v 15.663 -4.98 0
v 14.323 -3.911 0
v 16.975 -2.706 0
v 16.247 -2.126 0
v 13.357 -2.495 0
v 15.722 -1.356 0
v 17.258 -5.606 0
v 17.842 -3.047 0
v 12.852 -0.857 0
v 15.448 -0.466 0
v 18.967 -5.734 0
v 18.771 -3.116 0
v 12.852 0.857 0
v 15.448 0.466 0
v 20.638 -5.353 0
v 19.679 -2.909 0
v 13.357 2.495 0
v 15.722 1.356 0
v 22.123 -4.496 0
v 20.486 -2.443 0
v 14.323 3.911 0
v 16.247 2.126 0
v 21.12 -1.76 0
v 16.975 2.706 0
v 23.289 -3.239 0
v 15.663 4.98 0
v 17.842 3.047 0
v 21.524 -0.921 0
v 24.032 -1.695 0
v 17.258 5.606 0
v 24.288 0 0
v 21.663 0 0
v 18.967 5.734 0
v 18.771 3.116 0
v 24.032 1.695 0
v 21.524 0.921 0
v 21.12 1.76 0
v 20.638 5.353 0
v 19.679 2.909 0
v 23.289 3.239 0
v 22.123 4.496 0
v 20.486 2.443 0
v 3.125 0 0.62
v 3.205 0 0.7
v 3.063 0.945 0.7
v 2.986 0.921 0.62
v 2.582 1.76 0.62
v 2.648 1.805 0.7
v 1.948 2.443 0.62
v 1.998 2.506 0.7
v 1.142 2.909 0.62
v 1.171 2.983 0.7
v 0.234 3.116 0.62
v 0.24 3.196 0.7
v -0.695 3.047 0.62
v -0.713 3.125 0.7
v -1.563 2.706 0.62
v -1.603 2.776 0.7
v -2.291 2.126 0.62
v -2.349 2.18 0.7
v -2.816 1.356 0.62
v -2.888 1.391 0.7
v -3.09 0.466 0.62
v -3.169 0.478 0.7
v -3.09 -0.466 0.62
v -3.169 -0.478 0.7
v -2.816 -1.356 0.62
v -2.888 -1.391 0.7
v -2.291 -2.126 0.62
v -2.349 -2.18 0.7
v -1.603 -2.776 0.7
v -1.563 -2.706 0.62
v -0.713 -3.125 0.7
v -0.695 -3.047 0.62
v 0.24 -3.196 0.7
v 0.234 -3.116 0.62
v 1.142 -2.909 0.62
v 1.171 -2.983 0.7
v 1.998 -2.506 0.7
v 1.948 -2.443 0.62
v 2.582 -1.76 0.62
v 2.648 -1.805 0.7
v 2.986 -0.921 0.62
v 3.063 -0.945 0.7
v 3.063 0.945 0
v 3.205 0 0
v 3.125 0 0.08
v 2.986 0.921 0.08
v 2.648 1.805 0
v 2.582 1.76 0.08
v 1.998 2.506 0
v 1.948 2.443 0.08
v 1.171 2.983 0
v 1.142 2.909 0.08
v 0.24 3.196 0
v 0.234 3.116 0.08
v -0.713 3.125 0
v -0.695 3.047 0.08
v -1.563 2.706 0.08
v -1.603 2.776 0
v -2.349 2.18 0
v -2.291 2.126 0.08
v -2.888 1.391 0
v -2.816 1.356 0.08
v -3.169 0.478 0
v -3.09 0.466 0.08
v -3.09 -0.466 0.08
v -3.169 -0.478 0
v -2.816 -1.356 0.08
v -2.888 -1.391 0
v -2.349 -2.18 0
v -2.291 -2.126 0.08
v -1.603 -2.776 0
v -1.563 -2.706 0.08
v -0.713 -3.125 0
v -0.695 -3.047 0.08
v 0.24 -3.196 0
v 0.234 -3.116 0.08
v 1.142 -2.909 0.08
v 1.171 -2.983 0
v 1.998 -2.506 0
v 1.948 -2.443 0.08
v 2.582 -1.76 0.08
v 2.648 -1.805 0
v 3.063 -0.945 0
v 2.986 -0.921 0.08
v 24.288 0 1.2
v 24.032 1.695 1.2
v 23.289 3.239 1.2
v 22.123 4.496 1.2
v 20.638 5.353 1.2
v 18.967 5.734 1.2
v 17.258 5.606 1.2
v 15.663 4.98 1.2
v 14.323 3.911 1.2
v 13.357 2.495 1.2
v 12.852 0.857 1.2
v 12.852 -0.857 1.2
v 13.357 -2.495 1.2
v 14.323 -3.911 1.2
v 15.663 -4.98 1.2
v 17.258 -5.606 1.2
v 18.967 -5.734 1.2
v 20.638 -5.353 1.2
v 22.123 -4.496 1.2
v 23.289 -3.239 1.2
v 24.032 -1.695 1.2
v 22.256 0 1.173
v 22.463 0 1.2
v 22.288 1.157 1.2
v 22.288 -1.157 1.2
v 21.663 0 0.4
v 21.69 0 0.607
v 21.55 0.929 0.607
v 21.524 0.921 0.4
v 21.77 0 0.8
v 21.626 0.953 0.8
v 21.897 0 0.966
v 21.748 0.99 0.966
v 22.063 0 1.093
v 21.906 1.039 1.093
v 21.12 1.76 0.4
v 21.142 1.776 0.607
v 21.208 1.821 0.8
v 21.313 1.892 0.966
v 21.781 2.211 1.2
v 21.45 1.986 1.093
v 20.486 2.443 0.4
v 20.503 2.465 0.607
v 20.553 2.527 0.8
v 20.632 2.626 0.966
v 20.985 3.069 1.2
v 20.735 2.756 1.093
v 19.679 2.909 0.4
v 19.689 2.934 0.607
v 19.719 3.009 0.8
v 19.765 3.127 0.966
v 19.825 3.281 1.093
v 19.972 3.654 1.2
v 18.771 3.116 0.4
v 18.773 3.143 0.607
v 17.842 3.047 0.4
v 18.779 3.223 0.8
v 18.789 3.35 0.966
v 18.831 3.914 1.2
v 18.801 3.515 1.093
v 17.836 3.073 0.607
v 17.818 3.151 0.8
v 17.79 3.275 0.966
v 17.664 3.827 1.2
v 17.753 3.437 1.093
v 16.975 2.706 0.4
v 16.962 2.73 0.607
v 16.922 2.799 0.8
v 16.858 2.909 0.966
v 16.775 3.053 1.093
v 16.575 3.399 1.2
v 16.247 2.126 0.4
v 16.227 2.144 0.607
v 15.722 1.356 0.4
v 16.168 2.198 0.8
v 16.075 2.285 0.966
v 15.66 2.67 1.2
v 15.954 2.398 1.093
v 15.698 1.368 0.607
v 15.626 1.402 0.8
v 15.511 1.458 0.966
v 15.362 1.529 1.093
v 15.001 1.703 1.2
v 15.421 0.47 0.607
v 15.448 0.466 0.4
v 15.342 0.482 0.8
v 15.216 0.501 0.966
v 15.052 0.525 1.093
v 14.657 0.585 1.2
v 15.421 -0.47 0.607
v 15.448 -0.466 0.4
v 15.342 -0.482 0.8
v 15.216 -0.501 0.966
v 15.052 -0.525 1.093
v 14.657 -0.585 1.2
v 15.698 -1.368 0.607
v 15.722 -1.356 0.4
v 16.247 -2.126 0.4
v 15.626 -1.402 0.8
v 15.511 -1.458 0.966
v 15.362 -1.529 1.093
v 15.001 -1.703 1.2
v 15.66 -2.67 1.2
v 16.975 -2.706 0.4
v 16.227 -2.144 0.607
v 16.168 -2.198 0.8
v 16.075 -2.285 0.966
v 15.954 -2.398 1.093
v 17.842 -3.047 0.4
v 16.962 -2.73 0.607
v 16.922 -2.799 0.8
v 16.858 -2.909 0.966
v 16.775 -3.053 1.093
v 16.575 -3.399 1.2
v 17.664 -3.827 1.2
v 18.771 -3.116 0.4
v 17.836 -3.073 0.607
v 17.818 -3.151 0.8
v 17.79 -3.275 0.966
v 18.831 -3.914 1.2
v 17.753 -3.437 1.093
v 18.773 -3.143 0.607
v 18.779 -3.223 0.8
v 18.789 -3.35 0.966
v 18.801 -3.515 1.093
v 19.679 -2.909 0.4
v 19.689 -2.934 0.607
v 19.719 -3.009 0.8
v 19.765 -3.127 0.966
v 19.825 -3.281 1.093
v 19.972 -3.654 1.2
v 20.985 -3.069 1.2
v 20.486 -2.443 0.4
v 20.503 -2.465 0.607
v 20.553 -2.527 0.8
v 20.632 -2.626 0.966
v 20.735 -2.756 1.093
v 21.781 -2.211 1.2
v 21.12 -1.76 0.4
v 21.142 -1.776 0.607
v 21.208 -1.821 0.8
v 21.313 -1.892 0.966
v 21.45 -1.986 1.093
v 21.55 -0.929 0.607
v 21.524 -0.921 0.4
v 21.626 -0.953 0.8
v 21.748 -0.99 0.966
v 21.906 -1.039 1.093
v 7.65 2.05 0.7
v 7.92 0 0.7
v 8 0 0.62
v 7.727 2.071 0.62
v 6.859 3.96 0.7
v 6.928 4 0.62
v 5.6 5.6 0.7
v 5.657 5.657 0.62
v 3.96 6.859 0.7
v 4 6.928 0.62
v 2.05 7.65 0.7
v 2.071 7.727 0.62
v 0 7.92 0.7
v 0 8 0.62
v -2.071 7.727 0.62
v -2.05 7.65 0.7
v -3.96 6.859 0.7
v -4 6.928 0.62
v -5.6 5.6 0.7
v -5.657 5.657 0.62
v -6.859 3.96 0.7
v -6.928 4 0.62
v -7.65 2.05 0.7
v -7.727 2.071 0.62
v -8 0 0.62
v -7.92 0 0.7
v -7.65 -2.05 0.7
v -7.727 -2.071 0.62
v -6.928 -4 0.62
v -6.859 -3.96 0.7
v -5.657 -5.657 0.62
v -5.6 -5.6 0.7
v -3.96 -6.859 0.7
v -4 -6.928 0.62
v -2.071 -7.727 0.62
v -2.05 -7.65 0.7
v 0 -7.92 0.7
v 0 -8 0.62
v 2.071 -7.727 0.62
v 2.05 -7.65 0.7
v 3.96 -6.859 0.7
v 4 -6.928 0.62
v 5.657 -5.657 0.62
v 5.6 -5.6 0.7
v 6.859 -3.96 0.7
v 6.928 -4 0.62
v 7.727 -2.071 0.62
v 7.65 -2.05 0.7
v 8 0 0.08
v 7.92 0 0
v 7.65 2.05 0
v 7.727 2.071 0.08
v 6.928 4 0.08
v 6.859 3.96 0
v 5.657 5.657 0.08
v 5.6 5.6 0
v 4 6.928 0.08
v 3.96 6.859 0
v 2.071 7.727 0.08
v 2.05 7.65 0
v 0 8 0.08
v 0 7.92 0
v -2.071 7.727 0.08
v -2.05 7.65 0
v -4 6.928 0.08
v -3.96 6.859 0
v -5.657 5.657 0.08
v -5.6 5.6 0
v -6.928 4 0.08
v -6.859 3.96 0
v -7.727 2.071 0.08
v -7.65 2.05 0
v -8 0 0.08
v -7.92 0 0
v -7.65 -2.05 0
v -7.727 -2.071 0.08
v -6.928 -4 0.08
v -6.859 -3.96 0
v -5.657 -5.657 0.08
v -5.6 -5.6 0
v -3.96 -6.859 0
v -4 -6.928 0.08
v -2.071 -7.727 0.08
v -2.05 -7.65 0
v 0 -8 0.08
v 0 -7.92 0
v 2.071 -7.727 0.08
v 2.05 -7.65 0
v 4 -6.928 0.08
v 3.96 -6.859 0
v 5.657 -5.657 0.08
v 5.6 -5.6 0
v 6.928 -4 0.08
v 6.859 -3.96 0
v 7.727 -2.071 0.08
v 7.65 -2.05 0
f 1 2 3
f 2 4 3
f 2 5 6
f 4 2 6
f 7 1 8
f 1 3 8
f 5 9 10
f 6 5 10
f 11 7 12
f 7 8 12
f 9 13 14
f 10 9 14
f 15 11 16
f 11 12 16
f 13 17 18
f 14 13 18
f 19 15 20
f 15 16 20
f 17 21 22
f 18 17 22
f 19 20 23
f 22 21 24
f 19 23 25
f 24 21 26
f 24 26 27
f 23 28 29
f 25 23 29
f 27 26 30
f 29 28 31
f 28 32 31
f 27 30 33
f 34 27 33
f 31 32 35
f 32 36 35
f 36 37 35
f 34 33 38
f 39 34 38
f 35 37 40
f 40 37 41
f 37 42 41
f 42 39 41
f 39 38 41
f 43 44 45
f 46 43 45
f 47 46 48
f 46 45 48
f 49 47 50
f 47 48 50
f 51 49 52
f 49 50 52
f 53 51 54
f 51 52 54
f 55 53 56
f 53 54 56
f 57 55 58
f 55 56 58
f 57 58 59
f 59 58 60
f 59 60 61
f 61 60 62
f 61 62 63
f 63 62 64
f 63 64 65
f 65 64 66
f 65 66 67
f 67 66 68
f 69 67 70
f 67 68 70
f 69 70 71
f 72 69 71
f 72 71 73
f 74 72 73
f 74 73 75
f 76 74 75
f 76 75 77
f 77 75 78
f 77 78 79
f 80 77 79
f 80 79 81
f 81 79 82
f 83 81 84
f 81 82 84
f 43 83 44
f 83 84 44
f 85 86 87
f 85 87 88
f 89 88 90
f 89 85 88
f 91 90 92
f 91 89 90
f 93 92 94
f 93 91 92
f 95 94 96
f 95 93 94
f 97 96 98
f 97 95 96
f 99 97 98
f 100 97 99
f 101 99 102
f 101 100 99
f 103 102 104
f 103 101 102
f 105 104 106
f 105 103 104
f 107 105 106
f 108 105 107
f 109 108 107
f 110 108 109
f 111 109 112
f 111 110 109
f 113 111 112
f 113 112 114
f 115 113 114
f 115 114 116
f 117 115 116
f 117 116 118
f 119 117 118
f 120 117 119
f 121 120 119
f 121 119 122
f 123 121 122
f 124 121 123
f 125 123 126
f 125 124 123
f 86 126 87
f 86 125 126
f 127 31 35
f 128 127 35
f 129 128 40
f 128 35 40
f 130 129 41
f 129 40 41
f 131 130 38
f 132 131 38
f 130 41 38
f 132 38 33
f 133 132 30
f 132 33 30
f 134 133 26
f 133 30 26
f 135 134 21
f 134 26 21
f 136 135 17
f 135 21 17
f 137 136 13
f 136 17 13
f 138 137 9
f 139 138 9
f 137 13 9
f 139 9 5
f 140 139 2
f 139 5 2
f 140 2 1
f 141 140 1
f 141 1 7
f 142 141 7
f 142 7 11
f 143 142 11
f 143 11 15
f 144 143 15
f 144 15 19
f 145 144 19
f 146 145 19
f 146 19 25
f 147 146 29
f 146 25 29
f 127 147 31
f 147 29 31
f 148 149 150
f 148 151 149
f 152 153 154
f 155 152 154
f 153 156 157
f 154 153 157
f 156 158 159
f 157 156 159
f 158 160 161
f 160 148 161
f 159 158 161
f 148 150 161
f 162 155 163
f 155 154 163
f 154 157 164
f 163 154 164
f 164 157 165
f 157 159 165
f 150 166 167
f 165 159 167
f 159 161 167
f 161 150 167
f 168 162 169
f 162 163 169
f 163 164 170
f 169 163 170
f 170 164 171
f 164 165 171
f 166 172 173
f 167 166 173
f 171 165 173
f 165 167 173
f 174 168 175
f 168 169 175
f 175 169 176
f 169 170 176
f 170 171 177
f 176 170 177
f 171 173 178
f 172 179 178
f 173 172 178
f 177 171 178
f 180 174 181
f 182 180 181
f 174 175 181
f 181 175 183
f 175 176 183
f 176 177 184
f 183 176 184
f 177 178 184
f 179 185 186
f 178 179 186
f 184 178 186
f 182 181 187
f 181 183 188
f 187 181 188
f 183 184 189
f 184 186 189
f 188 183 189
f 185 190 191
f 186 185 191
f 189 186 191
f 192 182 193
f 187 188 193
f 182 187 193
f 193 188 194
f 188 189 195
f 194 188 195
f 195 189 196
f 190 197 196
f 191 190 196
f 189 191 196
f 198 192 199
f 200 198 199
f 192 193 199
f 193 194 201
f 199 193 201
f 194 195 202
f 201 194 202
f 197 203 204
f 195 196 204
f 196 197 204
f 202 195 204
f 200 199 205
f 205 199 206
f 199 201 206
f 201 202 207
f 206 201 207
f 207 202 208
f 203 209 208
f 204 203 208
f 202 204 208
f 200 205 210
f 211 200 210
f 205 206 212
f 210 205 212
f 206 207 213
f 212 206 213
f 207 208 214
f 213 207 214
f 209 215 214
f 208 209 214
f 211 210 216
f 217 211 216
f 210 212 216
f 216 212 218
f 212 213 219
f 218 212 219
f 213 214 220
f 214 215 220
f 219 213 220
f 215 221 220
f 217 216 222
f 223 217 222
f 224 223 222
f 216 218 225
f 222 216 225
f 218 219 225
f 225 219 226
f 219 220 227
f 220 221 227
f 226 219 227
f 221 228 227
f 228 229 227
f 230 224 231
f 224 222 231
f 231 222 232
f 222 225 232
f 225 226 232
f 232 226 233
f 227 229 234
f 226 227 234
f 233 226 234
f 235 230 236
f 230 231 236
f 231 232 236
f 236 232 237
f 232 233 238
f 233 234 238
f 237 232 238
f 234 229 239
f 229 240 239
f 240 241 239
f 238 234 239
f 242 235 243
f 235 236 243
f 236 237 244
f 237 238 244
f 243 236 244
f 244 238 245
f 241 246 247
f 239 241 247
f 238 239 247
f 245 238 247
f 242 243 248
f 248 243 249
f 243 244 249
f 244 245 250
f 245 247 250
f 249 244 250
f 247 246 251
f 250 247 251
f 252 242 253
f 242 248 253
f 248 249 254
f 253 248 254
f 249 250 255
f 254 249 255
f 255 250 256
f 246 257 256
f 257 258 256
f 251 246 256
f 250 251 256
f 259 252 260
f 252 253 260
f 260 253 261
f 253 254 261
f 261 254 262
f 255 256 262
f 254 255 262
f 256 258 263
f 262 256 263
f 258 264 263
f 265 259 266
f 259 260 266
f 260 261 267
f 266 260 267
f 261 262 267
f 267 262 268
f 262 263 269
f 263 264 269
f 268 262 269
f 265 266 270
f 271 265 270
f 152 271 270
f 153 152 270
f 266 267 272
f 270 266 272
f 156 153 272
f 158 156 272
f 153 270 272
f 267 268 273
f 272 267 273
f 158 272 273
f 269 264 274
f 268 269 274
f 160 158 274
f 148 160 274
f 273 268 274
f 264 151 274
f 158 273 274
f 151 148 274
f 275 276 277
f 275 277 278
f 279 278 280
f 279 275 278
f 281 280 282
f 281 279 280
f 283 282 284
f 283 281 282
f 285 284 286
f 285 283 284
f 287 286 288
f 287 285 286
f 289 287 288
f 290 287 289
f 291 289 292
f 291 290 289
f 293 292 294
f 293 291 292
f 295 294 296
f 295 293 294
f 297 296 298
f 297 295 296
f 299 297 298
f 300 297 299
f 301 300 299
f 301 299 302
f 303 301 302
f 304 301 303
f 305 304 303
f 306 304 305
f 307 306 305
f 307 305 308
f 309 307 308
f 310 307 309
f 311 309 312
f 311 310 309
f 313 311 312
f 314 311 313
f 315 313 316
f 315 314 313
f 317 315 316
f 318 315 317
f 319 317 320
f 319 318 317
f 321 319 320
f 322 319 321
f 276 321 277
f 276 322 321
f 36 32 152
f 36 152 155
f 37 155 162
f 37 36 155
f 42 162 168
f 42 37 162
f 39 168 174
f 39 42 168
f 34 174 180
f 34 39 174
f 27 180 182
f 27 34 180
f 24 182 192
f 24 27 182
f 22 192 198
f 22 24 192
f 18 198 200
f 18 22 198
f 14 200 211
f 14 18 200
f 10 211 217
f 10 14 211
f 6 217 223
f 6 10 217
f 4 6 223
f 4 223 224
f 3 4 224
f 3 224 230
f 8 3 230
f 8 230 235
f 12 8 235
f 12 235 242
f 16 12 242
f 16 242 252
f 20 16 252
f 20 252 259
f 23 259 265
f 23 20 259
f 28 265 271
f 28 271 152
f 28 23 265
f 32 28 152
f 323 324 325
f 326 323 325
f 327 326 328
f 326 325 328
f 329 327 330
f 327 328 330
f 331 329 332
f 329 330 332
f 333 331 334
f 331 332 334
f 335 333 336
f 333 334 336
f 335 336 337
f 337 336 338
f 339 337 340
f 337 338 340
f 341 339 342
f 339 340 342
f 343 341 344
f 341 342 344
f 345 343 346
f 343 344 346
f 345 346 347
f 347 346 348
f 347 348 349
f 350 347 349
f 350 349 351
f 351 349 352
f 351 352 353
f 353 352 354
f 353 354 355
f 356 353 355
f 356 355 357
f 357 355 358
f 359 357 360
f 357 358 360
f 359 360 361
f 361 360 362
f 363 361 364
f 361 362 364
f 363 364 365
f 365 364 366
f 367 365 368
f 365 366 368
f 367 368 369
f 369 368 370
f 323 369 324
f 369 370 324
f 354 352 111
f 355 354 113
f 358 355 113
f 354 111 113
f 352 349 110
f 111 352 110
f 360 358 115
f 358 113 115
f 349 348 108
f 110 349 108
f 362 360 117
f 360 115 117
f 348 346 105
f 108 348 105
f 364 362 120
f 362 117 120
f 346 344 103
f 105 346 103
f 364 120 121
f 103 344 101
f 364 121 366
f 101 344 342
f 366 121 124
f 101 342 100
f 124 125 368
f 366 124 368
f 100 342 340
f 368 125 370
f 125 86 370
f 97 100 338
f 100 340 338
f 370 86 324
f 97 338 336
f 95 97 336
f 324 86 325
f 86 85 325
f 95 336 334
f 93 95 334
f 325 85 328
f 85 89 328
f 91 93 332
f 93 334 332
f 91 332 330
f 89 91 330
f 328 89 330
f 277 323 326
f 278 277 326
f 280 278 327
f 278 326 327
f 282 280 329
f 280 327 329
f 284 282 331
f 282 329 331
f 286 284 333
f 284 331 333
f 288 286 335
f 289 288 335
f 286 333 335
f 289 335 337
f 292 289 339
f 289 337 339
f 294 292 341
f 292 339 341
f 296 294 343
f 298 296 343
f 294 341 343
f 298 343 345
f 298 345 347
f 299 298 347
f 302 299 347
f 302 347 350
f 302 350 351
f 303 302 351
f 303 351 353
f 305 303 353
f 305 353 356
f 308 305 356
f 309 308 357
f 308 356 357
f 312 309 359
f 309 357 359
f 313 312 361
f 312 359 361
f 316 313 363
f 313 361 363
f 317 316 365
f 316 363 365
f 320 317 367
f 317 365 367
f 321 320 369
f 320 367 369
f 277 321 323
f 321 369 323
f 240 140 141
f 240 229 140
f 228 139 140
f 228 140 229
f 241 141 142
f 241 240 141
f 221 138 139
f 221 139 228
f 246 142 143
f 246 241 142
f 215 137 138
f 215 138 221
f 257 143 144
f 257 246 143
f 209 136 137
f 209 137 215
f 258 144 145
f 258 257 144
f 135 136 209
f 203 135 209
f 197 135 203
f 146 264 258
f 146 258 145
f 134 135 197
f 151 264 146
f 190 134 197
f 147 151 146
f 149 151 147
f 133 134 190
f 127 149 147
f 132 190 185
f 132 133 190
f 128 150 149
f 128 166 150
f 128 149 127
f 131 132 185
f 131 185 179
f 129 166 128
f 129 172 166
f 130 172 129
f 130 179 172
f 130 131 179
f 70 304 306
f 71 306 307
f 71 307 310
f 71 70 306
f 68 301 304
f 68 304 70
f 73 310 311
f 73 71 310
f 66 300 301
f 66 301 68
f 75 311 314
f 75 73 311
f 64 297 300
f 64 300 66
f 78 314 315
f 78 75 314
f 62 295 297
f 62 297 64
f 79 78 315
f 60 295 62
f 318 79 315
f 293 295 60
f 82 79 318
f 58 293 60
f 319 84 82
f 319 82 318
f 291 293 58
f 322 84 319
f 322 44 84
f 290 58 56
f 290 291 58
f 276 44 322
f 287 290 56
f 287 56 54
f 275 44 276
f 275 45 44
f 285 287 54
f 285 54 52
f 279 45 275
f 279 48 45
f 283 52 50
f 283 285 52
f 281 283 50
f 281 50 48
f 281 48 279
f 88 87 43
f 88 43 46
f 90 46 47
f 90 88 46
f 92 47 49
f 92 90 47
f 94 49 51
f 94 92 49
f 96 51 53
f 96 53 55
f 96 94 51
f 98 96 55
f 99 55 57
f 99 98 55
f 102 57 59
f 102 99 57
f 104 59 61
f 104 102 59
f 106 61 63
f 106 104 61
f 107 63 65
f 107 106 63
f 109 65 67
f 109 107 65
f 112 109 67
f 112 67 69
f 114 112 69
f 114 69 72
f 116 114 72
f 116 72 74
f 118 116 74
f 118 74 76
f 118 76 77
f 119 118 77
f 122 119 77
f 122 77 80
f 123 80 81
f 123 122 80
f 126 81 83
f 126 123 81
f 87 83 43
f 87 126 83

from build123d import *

# Parameters (mm, degrees)
F0_R     = 8
F0_R_2   = 3.125
F1_DEPTH = 0.7
F2_SIZE  = 0.08
F0_R_3   = 5.75
F3_DEPTH = 1.2
F4_R     = 0.8


with BuildPart() as f1:
    # F0 (on Top) → F1 (new body)
    with BuildSketch(Plane.XY):
        Circle(F0_R)
        Circle(F0_R_2, mode=Mode.SUBTRACT)
    extrude(amount=F1_DEPTH)

    # F2
    f2_edges = [f1.edges().sort_by_distance(p)[0] for p in [
        (-8, 0, 0),
        (-8, 0, 0.7),
        (-3.125, 0, 0),
        (-3.125, 0, 0.7),
    ]]
    chamfer(f2_edges, length=F2_SIZE)


with BuildPart() as f3:
    # F0 (on Top) → F3 (new body)
    with BuildSketch(Plane.XY):
        with Locations((18.537663, 0)):
            Circle(F0_R_3)
        with Locations((18.537663, 0)):
            Circle(F0_R_2, mode=Mode.SUBTRACT)
    extrude(amount=F3_DEPTH)

    # F4
    f4_edges = [f3.edges().sort_by_distance(p)[0] for p in [
        (15.412663, 0, 1.2),
    ]]
    fillet(f4_edges, radius=F4_R)


solid = Compound([f1.part, f3.part])
